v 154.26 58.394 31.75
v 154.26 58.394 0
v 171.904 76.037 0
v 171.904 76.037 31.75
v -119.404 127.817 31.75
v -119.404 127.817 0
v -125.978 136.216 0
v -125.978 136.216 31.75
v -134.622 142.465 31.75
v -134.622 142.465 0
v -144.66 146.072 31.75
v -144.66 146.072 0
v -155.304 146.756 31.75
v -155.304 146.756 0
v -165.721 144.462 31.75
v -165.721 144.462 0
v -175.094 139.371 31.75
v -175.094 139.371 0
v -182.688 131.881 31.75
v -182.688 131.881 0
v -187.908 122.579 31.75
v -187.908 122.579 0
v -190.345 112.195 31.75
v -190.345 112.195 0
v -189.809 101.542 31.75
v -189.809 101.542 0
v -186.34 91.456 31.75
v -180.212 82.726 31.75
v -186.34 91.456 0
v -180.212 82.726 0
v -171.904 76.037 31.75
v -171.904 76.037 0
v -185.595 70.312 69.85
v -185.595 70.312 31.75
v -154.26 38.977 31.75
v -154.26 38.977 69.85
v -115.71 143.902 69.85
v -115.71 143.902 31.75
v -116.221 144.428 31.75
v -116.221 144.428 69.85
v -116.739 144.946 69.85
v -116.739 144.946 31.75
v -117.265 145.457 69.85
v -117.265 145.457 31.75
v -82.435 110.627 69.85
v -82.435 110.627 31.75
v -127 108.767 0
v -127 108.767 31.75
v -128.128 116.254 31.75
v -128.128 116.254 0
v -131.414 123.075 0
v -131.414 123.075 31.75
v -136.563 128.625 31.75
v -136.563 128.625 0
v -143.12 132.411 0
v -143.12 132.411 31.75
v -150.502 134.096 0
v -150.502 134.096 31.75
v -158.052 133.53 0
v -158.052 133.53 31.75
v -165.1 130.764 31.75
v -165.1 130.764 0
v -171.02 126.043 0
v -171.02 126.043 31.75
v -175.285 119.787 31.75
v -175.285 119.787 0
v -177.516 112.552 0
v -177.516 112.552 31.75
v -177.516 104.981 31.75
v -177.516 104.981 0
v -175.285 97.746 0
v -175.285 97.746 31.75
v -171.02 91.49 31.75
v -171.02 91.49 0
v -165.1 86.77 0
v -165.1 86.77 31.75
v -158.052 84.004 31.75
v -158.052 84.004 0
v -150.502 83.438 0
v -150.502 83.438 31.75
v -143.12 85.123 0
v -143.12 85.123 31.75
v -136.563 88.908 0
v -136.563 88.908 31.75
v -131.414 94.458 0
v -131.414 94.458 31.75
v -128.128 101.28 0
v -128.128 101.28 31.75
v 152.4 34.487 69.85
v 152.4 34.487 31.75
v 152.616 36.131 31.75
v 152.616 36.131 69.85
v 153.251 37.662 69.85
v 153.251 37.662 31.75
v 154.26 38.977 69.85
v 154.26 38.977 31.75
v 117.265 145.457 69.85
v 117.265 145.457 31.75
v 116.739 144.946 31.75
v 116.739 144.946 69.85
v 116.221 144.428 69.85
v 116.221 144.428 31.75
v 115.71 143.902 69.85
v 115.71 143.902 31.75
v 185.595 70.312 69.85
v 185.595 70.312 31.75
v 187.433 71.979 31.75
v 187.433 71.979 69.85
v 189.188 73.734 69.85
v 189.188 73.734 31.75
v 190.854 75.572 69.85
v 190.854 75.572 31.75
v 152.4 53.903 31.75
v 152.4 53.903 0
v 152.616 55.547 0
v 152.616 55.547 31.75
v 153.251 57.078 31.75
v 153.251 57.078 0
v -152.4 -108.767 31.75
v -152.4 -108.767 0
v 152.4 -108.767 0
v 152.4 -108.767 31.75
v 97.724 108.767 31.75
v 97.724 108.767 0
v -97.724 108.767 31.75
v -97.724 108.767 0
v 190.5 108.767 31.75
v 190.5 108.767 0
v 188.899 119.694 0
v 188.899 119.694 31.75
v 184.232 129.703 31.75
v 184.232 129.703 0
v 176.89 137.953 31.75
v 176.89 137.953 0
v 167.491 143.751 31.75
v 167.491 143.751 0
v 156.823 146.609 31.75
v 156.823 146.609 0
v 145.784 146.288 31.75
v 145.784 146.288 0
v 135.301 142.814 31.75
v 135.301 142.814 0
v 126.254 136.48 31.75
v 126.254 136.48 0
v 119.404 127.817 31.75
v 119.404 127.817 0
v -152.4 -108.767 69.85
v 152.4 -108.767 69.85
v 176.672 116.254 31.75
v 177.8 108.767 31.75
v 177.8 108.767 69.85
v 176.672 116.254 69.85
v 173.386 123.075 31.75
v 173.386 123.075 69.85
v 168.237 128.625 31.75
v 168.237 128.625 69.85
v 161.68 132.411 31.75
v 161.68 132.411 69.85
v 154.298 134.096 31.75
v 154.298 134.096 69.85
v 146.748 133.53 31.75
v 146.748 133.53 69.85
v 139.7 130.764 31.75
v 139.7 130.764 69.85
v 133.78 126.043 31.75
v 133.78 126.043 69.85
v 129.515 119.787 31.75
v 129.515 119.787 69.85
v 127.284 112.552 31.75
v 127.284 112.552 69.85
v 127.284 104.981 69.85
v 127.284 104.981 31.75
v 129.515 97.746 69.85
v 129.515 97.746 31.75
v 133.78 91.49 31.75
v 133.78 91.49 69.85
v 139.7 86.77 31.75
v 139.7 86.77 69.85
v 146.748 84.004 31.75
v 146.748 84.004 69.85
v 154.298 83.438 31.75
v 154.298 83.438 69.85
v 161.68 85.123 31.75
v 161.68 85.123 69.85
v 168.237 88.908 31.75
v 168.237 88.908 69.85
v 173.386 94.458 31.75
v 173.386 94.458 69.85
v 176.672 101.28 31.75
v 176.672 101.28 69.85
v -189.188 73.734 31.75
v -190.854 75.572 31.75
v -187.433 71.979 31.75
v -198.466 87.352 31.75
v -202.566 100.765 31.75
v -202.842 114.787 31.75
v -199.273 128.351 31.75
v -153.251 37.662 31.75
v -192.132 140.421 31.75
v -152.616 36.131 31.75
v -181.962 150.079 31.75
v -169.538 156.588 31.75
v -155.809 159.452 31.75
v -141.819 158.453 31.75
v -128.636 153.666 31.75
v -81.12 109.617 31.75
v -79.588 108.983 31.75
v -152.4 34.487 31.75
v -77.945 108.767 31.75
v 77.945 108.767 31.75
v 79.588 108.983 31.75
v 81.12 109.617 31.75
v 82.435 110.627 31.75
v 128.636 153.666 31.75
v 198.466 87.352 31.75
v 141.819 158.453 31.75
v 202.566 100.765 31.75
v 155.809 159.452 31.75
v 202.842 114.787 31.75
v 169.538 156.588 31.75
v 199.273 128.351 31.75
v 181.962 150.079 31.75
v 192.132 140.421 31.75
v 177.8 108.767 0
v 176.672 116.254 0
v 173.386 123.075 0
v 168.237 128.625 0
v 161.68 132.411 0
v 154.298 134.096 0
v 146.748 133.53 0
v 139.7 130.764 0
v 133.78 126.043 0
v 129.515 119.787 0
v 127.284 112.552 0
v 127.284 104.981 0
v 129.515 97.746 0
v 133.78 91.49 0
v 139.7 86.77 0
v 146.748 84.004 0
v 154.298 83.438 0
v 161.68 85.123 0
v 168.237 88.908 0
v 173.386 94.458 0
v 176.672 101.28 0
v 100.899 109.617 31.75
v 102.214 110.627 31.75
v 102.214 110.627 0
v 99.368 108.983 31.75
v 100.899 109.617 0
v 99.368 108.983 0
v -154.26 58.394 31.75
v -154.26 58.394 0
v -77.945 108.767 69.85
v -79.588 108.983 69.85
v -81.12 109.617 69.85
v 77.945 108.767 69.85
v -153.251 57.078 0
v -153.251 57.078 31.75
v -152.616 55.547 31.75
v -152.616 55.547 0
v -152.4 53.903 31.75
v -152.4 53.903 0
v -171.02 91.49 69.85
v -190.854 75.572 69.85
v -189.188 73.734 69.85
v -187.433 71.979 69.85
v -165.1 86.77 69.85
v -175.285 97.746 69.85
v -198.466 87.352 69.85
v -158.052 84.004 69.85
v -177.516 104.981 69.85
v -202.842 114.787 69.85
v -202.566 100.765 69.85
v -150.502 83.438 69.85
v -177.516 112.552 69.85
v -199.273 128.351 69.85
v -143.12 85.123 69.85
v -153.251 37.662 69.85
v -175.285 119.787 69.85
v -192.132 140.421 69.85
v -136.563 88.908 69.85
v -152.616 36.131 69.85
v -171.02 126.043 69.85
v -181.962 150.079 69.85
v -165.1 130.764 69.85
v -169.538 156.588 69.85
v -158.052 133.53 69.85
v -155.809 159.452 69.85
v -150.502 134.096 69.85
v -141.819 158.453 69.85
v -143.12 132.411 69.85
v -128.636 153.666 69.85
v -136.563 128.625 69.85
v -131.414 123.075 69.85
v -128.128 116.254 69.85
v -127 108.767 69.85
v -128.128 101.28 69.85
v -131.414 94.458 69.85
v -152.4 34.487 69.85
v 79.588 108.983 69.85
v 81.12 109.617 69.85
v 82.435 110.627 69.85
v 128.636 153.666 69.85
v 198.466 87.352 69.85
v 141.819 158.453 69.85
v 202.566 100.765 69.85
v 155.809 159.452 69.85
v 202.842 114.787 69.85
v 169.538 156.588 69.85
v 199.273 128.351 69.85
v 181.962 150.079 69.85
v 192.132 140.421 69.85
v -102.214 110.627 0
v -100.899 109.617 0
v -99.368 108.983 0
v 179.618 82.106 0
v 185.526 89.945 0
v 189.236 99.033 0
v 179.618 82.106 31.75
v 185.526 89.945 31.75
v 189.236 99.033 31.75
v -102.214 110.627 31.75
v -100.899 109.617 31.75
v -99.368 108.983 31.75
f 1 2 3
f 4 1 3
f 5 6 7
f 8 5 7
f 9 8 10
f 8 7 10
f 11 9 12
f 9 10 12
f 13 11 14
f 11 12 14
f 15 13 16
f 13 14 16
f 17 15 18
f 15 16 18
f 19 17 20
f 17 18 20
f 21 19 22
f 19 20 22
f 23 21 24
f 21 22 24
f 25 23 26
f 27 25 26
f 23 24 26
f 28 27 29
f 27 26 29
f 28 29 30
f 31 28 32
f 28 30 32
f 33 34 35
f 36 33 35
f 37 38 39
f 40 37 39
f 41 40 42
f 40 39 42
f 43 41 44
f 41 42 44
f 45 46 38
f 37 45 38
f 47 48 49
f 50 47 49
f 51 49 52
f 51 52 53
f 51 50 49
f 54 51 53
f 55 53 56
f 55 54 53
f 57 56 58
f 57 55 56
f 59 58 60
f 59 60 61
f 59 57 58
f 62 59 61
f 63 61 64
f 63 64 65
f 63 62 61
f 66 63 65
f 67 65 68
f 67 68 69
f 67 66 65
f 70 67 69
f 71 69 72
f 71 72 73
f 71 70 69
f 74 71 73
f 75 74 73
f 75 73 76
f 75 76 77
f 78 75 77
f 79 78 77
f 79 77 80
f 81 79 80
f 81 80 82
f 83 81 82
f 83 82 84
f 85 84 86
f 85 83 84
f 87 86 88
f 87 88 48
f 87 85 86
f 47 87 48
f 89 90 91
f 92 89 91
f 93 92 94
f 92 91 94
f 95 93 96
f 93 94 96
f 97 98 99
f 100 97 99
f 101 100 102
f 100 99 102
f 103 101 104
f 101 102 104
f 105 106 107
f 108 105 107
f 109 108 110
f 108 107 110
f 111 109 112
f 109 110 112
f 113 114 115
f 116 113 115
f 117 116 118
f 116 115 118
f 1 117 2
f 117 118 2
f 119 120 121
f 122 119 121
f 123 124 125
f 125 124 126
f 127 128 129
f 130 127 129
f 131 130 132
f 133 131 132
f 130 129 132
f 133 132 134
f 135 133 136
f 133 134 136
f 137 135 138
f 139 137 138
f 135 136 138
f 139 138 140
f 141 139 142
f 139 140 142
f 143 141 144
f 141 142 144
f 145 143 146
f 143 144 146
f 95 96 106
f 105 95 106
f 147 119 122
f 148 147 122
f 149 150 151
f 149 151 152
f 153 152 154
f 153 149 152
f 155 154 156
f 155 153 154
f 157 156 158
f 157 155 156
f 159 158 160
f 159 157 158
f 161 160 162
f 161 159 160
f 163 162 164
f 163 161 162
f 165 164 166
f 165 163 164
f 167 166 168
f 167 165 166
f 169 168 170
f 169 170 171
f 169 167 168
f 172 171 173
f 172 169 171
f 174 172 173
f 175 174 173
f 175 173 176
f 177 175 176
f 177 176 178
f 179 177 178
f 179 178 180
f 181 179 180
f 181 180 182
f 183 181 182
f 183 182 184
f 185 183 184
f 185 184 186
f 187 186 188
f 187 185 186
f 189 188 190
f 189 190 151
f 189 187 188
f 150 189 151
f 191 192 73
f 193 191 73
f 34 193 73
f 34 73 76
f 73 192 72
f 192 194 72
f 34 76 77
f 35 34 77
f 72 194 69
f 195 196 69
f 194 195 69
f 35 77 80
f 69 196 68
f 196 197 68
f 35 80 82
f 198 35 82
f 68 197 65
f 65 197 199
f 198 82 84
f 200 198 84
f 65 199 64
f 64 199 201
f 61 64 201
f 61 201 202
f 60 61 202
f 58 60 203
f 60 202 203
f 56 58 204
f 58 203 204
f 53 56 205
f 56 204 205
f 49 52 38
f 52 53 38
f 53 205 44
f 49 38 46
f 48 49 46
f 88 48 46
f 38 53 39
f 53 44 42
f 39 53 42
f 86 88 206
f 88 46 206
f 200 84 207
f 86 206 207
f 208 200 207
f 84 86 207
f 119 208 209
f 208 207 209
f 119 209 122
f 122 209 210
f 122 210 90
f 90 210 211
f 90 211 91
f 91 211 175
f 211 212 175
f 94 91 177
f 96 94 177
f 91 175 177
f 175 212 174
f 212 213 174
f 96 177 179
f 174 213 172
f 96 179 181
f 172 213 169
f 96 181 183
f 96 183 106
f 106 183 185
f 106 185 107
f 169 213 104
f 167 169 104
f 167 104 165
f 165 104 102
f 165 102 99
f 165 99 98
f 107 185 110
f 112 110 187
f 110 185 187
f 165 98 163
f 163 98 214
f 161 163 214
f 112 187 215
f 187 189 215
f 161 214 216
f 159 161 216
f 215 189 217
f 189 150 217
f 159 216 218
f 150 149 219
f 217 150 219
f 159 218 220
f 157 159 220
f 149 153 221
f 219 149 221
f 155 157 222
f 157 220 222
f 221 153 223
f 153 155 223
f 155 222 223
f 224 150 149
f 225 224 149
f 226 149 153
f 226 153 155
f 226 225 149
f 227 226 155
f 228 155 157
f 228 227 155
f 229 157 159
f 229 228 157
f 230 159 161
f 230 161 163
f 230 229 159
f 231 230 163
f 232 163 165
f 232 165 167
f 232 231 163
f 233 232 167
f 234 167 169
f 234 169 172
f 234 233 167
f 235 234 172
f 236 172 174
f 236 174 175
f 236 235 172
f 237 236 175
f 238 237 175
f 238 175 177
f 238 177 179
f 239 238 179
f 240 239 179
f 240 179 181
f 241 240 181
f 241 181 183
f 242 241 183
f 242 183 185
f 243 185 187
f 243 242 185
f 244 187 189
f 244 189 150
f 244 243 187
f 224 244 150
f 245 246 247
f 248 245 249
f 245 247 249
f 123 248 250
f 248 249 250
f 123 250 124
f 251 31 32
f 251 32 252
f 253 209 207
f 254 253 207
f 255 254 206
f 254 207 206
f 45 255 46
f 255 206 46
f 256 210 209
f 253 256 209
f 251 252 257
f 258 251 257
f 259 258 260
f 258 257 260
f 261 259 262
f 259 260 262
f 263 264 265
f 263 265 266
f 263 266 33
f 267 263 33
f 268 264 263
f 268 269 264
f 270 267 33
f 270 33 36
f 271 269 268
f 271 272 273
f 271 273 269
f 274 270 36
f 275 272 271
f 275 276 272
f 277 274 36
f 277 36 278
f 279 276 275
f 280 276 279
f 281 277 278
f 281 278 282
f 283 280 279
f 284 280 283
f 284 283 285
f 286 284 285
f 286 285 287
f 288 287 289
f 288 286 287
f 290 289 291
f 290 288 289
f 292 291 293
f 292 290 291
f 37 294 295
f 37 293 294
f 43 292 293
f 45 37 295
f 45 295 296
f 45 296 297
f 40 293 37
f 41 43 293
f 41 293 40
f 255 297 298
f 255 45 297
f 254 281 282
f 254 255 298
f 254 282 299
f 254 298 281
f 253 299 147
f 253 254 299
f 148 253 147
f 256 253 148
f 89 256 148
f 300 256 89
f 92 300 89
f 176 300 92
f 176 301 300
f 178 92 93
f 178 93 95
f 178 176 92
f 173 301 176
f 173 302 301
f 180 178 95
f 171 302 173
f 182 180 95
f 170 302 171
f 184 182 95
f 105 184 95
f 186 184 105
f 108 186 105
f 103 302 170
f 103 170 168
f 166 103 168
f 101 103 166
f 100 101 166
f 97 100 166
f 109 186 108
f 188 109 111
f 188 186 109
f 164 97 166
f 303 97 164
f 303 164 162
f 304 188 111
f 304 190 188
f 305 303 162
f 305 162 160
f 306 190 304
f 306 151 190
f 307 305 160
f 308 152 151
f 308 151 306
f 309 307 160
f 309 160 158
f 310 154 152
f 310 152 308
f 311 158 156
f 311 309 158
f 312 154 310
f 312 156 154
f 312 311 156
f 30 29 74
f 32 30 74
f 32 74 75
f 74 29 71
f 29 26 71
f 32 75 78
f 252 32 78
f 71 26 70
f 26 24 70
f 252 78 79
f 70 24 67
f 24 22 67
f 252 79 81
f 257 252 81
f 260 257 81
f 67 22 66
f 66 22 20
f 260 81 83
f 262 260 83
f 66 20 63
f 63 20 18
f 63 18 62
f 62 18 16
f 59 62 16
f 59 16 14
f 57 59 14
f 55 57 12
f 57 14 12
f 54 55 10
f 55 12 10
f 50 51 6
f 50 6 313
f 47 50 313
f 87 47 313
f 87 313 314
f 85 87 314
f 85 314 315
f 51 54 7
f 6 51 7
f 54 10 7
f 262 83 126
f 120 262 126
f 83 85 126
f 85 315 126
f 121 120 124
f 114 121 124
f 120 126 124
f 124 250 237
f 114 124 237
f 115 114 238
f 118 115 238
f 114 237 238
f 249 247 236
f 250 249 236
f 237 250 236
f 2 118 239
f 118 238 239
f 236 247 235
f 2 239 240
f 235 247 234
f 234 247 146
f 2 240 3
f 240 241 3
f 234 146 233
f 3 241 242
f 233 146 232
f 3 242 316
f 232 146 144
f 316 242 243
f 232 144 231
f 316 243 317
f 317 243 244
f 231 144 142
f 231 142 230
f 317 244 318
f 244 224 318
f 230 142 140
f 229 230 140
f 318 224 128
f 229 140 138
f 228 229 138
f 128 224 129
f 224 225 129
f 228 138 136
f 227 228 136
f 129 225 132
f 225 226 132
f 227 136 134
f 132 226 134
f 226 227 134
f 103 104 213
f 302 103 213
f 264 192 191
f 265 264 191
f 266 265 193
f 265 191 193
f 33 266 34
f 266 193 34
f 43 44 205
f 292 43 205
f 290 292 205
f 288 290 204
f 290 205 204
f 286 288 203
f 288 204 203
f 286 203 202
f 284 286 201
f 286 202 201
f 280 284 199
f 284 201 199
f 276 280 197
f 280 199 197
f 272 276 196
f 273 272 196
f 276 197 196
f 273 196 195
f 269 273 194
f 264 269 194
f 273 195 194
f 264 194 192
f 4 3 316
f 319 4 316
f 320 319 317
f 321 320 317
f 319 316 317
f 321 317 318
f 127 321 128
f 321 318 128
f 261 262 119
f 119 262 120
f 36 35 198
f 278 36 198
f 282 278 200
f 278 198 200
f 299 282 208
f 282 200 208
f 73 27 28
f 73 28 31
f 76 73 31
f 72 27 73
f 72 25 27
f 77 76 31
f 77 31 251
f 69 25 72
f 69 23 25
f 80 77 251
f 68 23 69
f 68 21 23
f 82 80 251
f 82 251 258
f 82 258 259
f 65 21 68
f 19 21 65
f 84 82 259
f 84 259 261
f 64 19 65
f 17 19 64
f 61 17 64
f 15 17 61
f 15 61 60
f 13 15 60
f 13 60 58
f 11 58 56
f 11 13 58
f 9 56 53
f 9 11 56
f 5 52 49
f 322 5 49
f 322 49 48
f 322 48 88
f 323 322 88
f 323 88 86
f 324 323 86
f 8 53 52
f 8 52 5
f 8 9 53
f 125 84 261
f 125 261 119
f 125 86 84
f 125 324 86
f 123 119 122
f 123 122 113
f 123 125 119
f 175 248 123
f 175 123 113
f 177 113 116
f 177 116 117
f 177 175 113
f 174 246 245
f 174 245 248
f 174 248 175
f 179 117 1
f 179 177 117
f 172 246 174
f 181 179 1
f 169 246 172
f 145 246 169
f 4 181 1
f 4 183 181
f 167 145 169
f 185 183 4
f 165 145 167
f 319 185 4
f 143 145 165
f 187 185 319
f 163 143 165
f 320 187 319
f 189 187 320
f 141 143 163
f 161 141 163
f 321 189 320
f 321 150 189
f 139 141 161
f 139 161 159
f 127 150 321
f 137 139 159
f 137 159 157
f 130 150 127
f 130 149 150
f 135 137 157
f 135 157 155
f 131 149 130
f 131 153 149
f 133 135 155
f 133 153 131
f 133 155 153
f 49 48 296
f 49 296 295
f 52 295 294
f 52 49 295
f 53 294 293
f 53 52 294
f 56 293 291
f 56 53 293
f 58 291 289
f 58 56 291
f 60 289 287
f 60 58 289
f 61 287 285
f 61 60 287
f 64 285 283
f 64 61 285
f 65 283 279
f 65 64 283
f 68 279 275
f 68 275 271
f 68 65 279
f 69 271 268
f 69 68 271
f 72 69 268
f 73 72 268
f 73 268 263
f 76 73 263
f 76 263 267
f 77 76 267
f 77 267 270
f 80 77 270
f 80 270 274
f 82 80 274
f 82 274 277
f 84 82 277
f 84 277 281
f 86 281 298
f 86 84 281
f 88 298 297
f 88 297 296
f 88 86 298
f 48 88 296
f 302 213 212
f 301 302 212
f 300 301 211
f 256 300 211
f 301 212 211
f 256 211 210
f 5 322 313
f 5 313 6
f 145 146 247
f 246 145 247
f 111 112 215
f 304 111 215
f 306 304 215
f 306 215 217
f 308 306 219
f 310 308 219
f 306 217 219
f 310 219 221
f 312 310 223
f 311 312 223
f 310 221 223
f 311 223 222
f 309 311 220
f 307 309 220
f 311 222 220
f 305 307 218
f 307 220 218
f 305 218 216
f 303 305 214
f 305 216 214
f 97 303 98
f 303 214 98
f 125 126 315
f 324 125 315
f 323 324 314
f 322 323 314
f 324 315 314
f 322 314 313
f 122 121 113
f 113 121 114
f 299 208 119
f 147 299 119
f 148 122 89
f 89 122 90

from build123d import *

# Parameters (mm, degrees)
F0_R     = 25.4
F1_DEPTH = 31.75
F4_R     = 25.4
F5_DEPTH = 38.1


with BuildPart() as f1:
    # F0 (on Top) → F1 (new body)
    with BuildSketch(Plane.XY):
        with BuildLine():
            Line((-152.4, 53.903384), (-152.4, -108.766722))
            Line((-152.4, -108.766722), (152.4, -108.766722))
            Line((152.4, -108.766722), (152.4, 53.903384))
            ThreePointArc((152.4, 53.903384), (152.883365, 56.333424), (154.259872, 58.393512))
            Line((154.259872, 58.393512), (171.903576, 76.037216))
            ThreePointArc((171.903576, 76.037216), (125.64579, 81.640678), (119.404432, 127.816722))
            Line((119.404432, 127.816722), (102.214304, 110.626594))
            ThreePointArc((102.214304, 110.626594), (100.154216, 109.250087), (97.724176, 108.766722))
            Line((97.724176, 108.766722), (-97.724176, 108.766722))
            ThreePointArc((-97.724176, 108.766722), (-100.154216, 109.250087), (-102.214304, 110.626594))
            Line((-102.214304, 110.626594), (-119.404432, 127.816722))
            ThreePointArc((-119.404432, 127.816722), (-115.598226, 118.627727), (-114.3, 108.766722))
            ThreePointArc((-114.3, 108.766722), (-125.459232, 81.825953), (-152.4, 70.666722))
            Line((-152.4, 70.666722), (-152.4, 53.903384))
        make_face()
        with BuildLine():
            ThreePointArc((-171.903576, 76.037216), (-162.514738, 72.033874), (-152.4, 70.666722))
            ThreePointArc((-152.4, 70.666722), (-125.459232, 81.825953), (-114.3, 108.766722))
            ThreePointArc((-114.3, 108.766722), (-115.598226, 118.627727), (-119.404432, 127.816722))
            ThreePointArc((-119.404432, 127.816722), (-179.15421, 135.892765), (-171.903576, 76.037216))
        make_face()
        with Locations((-152.4, 108.766722)):
            Circle(F0_R, mode=Mode.SUBTRACT)
        with BuildLine():
            ThreePointArc((119.404432, 127.816722), (125.64579, 81.640678), (171.903576, 76.037216))
            ThreePointArc((171.903576, 76.037216), (185.526245, 89.944876), (190.5, 108.766722))
            ThreePointArc((190.5, 108.766722), (162.261006, 145.568496), (119.404432, 127.816722))
        make_face()
        with Locations((152.4, 108.766722)):
            Circle(F0_R, mode=Mode.SUBTRACT)
        with BuildLine():
            ThreePointArc((-154.259872, 58.393512), (-152.883365, 56.333424), (-152.4, 53.903384))
            Line((-152.4, 53.903384), (-152.4, 70.666722))
            ThreePointArc((-152.4, 70.666722), (-162.514738, 72.033874), (-171.903576, 76.037216))
            Line((-171.903576, 76.037216), (-154.259872, 58.393512))
        make_face()
    extrude(amount=F1_DEPTH)


with BuildPart() as f2_1:
    # F2: copy of F1
    add(f1.part)


with BuildPart() as f5:
    # F4 (on face) → F5 (new body)
    with BuildSketch(Plane.XY.offset(31.75)):
        with BuildLine():
            Line((-152.4, -108.766722), (152.4, -108.766722))
            Line((152.4, -108.766722), (152.4, 34.487204))
            ThreePointArc((152.4, 34.487204), (152.883365, 36.917244), (154.259872, 38.977332))
            Line((154.259872, 38.977332), (185.594833, 70.312293))
            Line((185.594833, 70.312293), (190.854429, 75.571889))
            ThreePointArc((190.854429, 75.571889), (187.381702, 145.603124), (117.26457, 145.456523))
            Line((117.26457, 145.456523), (115.710199, 143.902152))
            Line((115.710199, 143.902152), (82.43464, 110.626594))
            ThreePointArc((82.43464, 110.626594), (80.374552, 109.250087), (77.944512, 108.766722))
            Line((77.944512, 108.766722), (-77.944512, 108.766722))
            ThreePointArc((-77.944512, 108.766722), (-80.374552, 109.250087), (-82.43464, 110.626594))
            Line((-82.43464, 110.626594), (-115.710199, 143.902152))
            Line((-115.710199, 143.902152), (-117.26457, 145.456523))
            ThreePointArc((-117.26457, 145.456523), (-187.381702, 145.603124), (-190.854429, 75.571889))
            Line((-190.854429, 75.571889), (-185.594833, 70.312293))
            Line((-185.594833, 70.312293), (-154.259872, 38.977332))
            ThreePointArc((-154.259872, 38.977332), (-152.883365, 36.917244), (-152.4, 34.487204))
            Line((-152.4, 34.487204), (-152.4, -108.766722))
        make_face()
        with Locations((-152.4, 108.766722)):
            Circle(F4_R, mode=Mode.SUBTRACT)
        with Locations((152.4, 108.766722)):
            Circle(F4_R, mode=Mode.SUBTRACT)
        with BuildLine():
            Line((190.854429, 75.571889), (185.594833, 70.312293))
            ThreePointArc((185.594833, 70.312293), (188.321024, 72.845697), (190.854429, 75.571889))
        make_face()
        with BuildLine():
            ThreePointArc((-190.854429, 75.571889), (-188.321024, 72.845697), (-185.594833, 70.312293))
            Line((-185.594833, 70.312293), (-190.854429, 75.571889))
        make_face()
        with BuildLine():
            Line((115.710199, 143.902152), (117.26457, 145.456523))
            ThreePointArc((117.26457, 145.456523), (116.478976, 144.687746), (115.710199, 143.902152))
        make_face()
        with BuildLine():
            ThreePointArc((-115.710199, 143.902152), (-116.478976, 144.687746), (-117.26457, 145.456523))
            Line((-117.26457, 145.456523), (-115.710199, 143.902152))
        make_face()
    extrude(amount=F5_DEPTH)


solid = Compound([f1.part, f5.part])
